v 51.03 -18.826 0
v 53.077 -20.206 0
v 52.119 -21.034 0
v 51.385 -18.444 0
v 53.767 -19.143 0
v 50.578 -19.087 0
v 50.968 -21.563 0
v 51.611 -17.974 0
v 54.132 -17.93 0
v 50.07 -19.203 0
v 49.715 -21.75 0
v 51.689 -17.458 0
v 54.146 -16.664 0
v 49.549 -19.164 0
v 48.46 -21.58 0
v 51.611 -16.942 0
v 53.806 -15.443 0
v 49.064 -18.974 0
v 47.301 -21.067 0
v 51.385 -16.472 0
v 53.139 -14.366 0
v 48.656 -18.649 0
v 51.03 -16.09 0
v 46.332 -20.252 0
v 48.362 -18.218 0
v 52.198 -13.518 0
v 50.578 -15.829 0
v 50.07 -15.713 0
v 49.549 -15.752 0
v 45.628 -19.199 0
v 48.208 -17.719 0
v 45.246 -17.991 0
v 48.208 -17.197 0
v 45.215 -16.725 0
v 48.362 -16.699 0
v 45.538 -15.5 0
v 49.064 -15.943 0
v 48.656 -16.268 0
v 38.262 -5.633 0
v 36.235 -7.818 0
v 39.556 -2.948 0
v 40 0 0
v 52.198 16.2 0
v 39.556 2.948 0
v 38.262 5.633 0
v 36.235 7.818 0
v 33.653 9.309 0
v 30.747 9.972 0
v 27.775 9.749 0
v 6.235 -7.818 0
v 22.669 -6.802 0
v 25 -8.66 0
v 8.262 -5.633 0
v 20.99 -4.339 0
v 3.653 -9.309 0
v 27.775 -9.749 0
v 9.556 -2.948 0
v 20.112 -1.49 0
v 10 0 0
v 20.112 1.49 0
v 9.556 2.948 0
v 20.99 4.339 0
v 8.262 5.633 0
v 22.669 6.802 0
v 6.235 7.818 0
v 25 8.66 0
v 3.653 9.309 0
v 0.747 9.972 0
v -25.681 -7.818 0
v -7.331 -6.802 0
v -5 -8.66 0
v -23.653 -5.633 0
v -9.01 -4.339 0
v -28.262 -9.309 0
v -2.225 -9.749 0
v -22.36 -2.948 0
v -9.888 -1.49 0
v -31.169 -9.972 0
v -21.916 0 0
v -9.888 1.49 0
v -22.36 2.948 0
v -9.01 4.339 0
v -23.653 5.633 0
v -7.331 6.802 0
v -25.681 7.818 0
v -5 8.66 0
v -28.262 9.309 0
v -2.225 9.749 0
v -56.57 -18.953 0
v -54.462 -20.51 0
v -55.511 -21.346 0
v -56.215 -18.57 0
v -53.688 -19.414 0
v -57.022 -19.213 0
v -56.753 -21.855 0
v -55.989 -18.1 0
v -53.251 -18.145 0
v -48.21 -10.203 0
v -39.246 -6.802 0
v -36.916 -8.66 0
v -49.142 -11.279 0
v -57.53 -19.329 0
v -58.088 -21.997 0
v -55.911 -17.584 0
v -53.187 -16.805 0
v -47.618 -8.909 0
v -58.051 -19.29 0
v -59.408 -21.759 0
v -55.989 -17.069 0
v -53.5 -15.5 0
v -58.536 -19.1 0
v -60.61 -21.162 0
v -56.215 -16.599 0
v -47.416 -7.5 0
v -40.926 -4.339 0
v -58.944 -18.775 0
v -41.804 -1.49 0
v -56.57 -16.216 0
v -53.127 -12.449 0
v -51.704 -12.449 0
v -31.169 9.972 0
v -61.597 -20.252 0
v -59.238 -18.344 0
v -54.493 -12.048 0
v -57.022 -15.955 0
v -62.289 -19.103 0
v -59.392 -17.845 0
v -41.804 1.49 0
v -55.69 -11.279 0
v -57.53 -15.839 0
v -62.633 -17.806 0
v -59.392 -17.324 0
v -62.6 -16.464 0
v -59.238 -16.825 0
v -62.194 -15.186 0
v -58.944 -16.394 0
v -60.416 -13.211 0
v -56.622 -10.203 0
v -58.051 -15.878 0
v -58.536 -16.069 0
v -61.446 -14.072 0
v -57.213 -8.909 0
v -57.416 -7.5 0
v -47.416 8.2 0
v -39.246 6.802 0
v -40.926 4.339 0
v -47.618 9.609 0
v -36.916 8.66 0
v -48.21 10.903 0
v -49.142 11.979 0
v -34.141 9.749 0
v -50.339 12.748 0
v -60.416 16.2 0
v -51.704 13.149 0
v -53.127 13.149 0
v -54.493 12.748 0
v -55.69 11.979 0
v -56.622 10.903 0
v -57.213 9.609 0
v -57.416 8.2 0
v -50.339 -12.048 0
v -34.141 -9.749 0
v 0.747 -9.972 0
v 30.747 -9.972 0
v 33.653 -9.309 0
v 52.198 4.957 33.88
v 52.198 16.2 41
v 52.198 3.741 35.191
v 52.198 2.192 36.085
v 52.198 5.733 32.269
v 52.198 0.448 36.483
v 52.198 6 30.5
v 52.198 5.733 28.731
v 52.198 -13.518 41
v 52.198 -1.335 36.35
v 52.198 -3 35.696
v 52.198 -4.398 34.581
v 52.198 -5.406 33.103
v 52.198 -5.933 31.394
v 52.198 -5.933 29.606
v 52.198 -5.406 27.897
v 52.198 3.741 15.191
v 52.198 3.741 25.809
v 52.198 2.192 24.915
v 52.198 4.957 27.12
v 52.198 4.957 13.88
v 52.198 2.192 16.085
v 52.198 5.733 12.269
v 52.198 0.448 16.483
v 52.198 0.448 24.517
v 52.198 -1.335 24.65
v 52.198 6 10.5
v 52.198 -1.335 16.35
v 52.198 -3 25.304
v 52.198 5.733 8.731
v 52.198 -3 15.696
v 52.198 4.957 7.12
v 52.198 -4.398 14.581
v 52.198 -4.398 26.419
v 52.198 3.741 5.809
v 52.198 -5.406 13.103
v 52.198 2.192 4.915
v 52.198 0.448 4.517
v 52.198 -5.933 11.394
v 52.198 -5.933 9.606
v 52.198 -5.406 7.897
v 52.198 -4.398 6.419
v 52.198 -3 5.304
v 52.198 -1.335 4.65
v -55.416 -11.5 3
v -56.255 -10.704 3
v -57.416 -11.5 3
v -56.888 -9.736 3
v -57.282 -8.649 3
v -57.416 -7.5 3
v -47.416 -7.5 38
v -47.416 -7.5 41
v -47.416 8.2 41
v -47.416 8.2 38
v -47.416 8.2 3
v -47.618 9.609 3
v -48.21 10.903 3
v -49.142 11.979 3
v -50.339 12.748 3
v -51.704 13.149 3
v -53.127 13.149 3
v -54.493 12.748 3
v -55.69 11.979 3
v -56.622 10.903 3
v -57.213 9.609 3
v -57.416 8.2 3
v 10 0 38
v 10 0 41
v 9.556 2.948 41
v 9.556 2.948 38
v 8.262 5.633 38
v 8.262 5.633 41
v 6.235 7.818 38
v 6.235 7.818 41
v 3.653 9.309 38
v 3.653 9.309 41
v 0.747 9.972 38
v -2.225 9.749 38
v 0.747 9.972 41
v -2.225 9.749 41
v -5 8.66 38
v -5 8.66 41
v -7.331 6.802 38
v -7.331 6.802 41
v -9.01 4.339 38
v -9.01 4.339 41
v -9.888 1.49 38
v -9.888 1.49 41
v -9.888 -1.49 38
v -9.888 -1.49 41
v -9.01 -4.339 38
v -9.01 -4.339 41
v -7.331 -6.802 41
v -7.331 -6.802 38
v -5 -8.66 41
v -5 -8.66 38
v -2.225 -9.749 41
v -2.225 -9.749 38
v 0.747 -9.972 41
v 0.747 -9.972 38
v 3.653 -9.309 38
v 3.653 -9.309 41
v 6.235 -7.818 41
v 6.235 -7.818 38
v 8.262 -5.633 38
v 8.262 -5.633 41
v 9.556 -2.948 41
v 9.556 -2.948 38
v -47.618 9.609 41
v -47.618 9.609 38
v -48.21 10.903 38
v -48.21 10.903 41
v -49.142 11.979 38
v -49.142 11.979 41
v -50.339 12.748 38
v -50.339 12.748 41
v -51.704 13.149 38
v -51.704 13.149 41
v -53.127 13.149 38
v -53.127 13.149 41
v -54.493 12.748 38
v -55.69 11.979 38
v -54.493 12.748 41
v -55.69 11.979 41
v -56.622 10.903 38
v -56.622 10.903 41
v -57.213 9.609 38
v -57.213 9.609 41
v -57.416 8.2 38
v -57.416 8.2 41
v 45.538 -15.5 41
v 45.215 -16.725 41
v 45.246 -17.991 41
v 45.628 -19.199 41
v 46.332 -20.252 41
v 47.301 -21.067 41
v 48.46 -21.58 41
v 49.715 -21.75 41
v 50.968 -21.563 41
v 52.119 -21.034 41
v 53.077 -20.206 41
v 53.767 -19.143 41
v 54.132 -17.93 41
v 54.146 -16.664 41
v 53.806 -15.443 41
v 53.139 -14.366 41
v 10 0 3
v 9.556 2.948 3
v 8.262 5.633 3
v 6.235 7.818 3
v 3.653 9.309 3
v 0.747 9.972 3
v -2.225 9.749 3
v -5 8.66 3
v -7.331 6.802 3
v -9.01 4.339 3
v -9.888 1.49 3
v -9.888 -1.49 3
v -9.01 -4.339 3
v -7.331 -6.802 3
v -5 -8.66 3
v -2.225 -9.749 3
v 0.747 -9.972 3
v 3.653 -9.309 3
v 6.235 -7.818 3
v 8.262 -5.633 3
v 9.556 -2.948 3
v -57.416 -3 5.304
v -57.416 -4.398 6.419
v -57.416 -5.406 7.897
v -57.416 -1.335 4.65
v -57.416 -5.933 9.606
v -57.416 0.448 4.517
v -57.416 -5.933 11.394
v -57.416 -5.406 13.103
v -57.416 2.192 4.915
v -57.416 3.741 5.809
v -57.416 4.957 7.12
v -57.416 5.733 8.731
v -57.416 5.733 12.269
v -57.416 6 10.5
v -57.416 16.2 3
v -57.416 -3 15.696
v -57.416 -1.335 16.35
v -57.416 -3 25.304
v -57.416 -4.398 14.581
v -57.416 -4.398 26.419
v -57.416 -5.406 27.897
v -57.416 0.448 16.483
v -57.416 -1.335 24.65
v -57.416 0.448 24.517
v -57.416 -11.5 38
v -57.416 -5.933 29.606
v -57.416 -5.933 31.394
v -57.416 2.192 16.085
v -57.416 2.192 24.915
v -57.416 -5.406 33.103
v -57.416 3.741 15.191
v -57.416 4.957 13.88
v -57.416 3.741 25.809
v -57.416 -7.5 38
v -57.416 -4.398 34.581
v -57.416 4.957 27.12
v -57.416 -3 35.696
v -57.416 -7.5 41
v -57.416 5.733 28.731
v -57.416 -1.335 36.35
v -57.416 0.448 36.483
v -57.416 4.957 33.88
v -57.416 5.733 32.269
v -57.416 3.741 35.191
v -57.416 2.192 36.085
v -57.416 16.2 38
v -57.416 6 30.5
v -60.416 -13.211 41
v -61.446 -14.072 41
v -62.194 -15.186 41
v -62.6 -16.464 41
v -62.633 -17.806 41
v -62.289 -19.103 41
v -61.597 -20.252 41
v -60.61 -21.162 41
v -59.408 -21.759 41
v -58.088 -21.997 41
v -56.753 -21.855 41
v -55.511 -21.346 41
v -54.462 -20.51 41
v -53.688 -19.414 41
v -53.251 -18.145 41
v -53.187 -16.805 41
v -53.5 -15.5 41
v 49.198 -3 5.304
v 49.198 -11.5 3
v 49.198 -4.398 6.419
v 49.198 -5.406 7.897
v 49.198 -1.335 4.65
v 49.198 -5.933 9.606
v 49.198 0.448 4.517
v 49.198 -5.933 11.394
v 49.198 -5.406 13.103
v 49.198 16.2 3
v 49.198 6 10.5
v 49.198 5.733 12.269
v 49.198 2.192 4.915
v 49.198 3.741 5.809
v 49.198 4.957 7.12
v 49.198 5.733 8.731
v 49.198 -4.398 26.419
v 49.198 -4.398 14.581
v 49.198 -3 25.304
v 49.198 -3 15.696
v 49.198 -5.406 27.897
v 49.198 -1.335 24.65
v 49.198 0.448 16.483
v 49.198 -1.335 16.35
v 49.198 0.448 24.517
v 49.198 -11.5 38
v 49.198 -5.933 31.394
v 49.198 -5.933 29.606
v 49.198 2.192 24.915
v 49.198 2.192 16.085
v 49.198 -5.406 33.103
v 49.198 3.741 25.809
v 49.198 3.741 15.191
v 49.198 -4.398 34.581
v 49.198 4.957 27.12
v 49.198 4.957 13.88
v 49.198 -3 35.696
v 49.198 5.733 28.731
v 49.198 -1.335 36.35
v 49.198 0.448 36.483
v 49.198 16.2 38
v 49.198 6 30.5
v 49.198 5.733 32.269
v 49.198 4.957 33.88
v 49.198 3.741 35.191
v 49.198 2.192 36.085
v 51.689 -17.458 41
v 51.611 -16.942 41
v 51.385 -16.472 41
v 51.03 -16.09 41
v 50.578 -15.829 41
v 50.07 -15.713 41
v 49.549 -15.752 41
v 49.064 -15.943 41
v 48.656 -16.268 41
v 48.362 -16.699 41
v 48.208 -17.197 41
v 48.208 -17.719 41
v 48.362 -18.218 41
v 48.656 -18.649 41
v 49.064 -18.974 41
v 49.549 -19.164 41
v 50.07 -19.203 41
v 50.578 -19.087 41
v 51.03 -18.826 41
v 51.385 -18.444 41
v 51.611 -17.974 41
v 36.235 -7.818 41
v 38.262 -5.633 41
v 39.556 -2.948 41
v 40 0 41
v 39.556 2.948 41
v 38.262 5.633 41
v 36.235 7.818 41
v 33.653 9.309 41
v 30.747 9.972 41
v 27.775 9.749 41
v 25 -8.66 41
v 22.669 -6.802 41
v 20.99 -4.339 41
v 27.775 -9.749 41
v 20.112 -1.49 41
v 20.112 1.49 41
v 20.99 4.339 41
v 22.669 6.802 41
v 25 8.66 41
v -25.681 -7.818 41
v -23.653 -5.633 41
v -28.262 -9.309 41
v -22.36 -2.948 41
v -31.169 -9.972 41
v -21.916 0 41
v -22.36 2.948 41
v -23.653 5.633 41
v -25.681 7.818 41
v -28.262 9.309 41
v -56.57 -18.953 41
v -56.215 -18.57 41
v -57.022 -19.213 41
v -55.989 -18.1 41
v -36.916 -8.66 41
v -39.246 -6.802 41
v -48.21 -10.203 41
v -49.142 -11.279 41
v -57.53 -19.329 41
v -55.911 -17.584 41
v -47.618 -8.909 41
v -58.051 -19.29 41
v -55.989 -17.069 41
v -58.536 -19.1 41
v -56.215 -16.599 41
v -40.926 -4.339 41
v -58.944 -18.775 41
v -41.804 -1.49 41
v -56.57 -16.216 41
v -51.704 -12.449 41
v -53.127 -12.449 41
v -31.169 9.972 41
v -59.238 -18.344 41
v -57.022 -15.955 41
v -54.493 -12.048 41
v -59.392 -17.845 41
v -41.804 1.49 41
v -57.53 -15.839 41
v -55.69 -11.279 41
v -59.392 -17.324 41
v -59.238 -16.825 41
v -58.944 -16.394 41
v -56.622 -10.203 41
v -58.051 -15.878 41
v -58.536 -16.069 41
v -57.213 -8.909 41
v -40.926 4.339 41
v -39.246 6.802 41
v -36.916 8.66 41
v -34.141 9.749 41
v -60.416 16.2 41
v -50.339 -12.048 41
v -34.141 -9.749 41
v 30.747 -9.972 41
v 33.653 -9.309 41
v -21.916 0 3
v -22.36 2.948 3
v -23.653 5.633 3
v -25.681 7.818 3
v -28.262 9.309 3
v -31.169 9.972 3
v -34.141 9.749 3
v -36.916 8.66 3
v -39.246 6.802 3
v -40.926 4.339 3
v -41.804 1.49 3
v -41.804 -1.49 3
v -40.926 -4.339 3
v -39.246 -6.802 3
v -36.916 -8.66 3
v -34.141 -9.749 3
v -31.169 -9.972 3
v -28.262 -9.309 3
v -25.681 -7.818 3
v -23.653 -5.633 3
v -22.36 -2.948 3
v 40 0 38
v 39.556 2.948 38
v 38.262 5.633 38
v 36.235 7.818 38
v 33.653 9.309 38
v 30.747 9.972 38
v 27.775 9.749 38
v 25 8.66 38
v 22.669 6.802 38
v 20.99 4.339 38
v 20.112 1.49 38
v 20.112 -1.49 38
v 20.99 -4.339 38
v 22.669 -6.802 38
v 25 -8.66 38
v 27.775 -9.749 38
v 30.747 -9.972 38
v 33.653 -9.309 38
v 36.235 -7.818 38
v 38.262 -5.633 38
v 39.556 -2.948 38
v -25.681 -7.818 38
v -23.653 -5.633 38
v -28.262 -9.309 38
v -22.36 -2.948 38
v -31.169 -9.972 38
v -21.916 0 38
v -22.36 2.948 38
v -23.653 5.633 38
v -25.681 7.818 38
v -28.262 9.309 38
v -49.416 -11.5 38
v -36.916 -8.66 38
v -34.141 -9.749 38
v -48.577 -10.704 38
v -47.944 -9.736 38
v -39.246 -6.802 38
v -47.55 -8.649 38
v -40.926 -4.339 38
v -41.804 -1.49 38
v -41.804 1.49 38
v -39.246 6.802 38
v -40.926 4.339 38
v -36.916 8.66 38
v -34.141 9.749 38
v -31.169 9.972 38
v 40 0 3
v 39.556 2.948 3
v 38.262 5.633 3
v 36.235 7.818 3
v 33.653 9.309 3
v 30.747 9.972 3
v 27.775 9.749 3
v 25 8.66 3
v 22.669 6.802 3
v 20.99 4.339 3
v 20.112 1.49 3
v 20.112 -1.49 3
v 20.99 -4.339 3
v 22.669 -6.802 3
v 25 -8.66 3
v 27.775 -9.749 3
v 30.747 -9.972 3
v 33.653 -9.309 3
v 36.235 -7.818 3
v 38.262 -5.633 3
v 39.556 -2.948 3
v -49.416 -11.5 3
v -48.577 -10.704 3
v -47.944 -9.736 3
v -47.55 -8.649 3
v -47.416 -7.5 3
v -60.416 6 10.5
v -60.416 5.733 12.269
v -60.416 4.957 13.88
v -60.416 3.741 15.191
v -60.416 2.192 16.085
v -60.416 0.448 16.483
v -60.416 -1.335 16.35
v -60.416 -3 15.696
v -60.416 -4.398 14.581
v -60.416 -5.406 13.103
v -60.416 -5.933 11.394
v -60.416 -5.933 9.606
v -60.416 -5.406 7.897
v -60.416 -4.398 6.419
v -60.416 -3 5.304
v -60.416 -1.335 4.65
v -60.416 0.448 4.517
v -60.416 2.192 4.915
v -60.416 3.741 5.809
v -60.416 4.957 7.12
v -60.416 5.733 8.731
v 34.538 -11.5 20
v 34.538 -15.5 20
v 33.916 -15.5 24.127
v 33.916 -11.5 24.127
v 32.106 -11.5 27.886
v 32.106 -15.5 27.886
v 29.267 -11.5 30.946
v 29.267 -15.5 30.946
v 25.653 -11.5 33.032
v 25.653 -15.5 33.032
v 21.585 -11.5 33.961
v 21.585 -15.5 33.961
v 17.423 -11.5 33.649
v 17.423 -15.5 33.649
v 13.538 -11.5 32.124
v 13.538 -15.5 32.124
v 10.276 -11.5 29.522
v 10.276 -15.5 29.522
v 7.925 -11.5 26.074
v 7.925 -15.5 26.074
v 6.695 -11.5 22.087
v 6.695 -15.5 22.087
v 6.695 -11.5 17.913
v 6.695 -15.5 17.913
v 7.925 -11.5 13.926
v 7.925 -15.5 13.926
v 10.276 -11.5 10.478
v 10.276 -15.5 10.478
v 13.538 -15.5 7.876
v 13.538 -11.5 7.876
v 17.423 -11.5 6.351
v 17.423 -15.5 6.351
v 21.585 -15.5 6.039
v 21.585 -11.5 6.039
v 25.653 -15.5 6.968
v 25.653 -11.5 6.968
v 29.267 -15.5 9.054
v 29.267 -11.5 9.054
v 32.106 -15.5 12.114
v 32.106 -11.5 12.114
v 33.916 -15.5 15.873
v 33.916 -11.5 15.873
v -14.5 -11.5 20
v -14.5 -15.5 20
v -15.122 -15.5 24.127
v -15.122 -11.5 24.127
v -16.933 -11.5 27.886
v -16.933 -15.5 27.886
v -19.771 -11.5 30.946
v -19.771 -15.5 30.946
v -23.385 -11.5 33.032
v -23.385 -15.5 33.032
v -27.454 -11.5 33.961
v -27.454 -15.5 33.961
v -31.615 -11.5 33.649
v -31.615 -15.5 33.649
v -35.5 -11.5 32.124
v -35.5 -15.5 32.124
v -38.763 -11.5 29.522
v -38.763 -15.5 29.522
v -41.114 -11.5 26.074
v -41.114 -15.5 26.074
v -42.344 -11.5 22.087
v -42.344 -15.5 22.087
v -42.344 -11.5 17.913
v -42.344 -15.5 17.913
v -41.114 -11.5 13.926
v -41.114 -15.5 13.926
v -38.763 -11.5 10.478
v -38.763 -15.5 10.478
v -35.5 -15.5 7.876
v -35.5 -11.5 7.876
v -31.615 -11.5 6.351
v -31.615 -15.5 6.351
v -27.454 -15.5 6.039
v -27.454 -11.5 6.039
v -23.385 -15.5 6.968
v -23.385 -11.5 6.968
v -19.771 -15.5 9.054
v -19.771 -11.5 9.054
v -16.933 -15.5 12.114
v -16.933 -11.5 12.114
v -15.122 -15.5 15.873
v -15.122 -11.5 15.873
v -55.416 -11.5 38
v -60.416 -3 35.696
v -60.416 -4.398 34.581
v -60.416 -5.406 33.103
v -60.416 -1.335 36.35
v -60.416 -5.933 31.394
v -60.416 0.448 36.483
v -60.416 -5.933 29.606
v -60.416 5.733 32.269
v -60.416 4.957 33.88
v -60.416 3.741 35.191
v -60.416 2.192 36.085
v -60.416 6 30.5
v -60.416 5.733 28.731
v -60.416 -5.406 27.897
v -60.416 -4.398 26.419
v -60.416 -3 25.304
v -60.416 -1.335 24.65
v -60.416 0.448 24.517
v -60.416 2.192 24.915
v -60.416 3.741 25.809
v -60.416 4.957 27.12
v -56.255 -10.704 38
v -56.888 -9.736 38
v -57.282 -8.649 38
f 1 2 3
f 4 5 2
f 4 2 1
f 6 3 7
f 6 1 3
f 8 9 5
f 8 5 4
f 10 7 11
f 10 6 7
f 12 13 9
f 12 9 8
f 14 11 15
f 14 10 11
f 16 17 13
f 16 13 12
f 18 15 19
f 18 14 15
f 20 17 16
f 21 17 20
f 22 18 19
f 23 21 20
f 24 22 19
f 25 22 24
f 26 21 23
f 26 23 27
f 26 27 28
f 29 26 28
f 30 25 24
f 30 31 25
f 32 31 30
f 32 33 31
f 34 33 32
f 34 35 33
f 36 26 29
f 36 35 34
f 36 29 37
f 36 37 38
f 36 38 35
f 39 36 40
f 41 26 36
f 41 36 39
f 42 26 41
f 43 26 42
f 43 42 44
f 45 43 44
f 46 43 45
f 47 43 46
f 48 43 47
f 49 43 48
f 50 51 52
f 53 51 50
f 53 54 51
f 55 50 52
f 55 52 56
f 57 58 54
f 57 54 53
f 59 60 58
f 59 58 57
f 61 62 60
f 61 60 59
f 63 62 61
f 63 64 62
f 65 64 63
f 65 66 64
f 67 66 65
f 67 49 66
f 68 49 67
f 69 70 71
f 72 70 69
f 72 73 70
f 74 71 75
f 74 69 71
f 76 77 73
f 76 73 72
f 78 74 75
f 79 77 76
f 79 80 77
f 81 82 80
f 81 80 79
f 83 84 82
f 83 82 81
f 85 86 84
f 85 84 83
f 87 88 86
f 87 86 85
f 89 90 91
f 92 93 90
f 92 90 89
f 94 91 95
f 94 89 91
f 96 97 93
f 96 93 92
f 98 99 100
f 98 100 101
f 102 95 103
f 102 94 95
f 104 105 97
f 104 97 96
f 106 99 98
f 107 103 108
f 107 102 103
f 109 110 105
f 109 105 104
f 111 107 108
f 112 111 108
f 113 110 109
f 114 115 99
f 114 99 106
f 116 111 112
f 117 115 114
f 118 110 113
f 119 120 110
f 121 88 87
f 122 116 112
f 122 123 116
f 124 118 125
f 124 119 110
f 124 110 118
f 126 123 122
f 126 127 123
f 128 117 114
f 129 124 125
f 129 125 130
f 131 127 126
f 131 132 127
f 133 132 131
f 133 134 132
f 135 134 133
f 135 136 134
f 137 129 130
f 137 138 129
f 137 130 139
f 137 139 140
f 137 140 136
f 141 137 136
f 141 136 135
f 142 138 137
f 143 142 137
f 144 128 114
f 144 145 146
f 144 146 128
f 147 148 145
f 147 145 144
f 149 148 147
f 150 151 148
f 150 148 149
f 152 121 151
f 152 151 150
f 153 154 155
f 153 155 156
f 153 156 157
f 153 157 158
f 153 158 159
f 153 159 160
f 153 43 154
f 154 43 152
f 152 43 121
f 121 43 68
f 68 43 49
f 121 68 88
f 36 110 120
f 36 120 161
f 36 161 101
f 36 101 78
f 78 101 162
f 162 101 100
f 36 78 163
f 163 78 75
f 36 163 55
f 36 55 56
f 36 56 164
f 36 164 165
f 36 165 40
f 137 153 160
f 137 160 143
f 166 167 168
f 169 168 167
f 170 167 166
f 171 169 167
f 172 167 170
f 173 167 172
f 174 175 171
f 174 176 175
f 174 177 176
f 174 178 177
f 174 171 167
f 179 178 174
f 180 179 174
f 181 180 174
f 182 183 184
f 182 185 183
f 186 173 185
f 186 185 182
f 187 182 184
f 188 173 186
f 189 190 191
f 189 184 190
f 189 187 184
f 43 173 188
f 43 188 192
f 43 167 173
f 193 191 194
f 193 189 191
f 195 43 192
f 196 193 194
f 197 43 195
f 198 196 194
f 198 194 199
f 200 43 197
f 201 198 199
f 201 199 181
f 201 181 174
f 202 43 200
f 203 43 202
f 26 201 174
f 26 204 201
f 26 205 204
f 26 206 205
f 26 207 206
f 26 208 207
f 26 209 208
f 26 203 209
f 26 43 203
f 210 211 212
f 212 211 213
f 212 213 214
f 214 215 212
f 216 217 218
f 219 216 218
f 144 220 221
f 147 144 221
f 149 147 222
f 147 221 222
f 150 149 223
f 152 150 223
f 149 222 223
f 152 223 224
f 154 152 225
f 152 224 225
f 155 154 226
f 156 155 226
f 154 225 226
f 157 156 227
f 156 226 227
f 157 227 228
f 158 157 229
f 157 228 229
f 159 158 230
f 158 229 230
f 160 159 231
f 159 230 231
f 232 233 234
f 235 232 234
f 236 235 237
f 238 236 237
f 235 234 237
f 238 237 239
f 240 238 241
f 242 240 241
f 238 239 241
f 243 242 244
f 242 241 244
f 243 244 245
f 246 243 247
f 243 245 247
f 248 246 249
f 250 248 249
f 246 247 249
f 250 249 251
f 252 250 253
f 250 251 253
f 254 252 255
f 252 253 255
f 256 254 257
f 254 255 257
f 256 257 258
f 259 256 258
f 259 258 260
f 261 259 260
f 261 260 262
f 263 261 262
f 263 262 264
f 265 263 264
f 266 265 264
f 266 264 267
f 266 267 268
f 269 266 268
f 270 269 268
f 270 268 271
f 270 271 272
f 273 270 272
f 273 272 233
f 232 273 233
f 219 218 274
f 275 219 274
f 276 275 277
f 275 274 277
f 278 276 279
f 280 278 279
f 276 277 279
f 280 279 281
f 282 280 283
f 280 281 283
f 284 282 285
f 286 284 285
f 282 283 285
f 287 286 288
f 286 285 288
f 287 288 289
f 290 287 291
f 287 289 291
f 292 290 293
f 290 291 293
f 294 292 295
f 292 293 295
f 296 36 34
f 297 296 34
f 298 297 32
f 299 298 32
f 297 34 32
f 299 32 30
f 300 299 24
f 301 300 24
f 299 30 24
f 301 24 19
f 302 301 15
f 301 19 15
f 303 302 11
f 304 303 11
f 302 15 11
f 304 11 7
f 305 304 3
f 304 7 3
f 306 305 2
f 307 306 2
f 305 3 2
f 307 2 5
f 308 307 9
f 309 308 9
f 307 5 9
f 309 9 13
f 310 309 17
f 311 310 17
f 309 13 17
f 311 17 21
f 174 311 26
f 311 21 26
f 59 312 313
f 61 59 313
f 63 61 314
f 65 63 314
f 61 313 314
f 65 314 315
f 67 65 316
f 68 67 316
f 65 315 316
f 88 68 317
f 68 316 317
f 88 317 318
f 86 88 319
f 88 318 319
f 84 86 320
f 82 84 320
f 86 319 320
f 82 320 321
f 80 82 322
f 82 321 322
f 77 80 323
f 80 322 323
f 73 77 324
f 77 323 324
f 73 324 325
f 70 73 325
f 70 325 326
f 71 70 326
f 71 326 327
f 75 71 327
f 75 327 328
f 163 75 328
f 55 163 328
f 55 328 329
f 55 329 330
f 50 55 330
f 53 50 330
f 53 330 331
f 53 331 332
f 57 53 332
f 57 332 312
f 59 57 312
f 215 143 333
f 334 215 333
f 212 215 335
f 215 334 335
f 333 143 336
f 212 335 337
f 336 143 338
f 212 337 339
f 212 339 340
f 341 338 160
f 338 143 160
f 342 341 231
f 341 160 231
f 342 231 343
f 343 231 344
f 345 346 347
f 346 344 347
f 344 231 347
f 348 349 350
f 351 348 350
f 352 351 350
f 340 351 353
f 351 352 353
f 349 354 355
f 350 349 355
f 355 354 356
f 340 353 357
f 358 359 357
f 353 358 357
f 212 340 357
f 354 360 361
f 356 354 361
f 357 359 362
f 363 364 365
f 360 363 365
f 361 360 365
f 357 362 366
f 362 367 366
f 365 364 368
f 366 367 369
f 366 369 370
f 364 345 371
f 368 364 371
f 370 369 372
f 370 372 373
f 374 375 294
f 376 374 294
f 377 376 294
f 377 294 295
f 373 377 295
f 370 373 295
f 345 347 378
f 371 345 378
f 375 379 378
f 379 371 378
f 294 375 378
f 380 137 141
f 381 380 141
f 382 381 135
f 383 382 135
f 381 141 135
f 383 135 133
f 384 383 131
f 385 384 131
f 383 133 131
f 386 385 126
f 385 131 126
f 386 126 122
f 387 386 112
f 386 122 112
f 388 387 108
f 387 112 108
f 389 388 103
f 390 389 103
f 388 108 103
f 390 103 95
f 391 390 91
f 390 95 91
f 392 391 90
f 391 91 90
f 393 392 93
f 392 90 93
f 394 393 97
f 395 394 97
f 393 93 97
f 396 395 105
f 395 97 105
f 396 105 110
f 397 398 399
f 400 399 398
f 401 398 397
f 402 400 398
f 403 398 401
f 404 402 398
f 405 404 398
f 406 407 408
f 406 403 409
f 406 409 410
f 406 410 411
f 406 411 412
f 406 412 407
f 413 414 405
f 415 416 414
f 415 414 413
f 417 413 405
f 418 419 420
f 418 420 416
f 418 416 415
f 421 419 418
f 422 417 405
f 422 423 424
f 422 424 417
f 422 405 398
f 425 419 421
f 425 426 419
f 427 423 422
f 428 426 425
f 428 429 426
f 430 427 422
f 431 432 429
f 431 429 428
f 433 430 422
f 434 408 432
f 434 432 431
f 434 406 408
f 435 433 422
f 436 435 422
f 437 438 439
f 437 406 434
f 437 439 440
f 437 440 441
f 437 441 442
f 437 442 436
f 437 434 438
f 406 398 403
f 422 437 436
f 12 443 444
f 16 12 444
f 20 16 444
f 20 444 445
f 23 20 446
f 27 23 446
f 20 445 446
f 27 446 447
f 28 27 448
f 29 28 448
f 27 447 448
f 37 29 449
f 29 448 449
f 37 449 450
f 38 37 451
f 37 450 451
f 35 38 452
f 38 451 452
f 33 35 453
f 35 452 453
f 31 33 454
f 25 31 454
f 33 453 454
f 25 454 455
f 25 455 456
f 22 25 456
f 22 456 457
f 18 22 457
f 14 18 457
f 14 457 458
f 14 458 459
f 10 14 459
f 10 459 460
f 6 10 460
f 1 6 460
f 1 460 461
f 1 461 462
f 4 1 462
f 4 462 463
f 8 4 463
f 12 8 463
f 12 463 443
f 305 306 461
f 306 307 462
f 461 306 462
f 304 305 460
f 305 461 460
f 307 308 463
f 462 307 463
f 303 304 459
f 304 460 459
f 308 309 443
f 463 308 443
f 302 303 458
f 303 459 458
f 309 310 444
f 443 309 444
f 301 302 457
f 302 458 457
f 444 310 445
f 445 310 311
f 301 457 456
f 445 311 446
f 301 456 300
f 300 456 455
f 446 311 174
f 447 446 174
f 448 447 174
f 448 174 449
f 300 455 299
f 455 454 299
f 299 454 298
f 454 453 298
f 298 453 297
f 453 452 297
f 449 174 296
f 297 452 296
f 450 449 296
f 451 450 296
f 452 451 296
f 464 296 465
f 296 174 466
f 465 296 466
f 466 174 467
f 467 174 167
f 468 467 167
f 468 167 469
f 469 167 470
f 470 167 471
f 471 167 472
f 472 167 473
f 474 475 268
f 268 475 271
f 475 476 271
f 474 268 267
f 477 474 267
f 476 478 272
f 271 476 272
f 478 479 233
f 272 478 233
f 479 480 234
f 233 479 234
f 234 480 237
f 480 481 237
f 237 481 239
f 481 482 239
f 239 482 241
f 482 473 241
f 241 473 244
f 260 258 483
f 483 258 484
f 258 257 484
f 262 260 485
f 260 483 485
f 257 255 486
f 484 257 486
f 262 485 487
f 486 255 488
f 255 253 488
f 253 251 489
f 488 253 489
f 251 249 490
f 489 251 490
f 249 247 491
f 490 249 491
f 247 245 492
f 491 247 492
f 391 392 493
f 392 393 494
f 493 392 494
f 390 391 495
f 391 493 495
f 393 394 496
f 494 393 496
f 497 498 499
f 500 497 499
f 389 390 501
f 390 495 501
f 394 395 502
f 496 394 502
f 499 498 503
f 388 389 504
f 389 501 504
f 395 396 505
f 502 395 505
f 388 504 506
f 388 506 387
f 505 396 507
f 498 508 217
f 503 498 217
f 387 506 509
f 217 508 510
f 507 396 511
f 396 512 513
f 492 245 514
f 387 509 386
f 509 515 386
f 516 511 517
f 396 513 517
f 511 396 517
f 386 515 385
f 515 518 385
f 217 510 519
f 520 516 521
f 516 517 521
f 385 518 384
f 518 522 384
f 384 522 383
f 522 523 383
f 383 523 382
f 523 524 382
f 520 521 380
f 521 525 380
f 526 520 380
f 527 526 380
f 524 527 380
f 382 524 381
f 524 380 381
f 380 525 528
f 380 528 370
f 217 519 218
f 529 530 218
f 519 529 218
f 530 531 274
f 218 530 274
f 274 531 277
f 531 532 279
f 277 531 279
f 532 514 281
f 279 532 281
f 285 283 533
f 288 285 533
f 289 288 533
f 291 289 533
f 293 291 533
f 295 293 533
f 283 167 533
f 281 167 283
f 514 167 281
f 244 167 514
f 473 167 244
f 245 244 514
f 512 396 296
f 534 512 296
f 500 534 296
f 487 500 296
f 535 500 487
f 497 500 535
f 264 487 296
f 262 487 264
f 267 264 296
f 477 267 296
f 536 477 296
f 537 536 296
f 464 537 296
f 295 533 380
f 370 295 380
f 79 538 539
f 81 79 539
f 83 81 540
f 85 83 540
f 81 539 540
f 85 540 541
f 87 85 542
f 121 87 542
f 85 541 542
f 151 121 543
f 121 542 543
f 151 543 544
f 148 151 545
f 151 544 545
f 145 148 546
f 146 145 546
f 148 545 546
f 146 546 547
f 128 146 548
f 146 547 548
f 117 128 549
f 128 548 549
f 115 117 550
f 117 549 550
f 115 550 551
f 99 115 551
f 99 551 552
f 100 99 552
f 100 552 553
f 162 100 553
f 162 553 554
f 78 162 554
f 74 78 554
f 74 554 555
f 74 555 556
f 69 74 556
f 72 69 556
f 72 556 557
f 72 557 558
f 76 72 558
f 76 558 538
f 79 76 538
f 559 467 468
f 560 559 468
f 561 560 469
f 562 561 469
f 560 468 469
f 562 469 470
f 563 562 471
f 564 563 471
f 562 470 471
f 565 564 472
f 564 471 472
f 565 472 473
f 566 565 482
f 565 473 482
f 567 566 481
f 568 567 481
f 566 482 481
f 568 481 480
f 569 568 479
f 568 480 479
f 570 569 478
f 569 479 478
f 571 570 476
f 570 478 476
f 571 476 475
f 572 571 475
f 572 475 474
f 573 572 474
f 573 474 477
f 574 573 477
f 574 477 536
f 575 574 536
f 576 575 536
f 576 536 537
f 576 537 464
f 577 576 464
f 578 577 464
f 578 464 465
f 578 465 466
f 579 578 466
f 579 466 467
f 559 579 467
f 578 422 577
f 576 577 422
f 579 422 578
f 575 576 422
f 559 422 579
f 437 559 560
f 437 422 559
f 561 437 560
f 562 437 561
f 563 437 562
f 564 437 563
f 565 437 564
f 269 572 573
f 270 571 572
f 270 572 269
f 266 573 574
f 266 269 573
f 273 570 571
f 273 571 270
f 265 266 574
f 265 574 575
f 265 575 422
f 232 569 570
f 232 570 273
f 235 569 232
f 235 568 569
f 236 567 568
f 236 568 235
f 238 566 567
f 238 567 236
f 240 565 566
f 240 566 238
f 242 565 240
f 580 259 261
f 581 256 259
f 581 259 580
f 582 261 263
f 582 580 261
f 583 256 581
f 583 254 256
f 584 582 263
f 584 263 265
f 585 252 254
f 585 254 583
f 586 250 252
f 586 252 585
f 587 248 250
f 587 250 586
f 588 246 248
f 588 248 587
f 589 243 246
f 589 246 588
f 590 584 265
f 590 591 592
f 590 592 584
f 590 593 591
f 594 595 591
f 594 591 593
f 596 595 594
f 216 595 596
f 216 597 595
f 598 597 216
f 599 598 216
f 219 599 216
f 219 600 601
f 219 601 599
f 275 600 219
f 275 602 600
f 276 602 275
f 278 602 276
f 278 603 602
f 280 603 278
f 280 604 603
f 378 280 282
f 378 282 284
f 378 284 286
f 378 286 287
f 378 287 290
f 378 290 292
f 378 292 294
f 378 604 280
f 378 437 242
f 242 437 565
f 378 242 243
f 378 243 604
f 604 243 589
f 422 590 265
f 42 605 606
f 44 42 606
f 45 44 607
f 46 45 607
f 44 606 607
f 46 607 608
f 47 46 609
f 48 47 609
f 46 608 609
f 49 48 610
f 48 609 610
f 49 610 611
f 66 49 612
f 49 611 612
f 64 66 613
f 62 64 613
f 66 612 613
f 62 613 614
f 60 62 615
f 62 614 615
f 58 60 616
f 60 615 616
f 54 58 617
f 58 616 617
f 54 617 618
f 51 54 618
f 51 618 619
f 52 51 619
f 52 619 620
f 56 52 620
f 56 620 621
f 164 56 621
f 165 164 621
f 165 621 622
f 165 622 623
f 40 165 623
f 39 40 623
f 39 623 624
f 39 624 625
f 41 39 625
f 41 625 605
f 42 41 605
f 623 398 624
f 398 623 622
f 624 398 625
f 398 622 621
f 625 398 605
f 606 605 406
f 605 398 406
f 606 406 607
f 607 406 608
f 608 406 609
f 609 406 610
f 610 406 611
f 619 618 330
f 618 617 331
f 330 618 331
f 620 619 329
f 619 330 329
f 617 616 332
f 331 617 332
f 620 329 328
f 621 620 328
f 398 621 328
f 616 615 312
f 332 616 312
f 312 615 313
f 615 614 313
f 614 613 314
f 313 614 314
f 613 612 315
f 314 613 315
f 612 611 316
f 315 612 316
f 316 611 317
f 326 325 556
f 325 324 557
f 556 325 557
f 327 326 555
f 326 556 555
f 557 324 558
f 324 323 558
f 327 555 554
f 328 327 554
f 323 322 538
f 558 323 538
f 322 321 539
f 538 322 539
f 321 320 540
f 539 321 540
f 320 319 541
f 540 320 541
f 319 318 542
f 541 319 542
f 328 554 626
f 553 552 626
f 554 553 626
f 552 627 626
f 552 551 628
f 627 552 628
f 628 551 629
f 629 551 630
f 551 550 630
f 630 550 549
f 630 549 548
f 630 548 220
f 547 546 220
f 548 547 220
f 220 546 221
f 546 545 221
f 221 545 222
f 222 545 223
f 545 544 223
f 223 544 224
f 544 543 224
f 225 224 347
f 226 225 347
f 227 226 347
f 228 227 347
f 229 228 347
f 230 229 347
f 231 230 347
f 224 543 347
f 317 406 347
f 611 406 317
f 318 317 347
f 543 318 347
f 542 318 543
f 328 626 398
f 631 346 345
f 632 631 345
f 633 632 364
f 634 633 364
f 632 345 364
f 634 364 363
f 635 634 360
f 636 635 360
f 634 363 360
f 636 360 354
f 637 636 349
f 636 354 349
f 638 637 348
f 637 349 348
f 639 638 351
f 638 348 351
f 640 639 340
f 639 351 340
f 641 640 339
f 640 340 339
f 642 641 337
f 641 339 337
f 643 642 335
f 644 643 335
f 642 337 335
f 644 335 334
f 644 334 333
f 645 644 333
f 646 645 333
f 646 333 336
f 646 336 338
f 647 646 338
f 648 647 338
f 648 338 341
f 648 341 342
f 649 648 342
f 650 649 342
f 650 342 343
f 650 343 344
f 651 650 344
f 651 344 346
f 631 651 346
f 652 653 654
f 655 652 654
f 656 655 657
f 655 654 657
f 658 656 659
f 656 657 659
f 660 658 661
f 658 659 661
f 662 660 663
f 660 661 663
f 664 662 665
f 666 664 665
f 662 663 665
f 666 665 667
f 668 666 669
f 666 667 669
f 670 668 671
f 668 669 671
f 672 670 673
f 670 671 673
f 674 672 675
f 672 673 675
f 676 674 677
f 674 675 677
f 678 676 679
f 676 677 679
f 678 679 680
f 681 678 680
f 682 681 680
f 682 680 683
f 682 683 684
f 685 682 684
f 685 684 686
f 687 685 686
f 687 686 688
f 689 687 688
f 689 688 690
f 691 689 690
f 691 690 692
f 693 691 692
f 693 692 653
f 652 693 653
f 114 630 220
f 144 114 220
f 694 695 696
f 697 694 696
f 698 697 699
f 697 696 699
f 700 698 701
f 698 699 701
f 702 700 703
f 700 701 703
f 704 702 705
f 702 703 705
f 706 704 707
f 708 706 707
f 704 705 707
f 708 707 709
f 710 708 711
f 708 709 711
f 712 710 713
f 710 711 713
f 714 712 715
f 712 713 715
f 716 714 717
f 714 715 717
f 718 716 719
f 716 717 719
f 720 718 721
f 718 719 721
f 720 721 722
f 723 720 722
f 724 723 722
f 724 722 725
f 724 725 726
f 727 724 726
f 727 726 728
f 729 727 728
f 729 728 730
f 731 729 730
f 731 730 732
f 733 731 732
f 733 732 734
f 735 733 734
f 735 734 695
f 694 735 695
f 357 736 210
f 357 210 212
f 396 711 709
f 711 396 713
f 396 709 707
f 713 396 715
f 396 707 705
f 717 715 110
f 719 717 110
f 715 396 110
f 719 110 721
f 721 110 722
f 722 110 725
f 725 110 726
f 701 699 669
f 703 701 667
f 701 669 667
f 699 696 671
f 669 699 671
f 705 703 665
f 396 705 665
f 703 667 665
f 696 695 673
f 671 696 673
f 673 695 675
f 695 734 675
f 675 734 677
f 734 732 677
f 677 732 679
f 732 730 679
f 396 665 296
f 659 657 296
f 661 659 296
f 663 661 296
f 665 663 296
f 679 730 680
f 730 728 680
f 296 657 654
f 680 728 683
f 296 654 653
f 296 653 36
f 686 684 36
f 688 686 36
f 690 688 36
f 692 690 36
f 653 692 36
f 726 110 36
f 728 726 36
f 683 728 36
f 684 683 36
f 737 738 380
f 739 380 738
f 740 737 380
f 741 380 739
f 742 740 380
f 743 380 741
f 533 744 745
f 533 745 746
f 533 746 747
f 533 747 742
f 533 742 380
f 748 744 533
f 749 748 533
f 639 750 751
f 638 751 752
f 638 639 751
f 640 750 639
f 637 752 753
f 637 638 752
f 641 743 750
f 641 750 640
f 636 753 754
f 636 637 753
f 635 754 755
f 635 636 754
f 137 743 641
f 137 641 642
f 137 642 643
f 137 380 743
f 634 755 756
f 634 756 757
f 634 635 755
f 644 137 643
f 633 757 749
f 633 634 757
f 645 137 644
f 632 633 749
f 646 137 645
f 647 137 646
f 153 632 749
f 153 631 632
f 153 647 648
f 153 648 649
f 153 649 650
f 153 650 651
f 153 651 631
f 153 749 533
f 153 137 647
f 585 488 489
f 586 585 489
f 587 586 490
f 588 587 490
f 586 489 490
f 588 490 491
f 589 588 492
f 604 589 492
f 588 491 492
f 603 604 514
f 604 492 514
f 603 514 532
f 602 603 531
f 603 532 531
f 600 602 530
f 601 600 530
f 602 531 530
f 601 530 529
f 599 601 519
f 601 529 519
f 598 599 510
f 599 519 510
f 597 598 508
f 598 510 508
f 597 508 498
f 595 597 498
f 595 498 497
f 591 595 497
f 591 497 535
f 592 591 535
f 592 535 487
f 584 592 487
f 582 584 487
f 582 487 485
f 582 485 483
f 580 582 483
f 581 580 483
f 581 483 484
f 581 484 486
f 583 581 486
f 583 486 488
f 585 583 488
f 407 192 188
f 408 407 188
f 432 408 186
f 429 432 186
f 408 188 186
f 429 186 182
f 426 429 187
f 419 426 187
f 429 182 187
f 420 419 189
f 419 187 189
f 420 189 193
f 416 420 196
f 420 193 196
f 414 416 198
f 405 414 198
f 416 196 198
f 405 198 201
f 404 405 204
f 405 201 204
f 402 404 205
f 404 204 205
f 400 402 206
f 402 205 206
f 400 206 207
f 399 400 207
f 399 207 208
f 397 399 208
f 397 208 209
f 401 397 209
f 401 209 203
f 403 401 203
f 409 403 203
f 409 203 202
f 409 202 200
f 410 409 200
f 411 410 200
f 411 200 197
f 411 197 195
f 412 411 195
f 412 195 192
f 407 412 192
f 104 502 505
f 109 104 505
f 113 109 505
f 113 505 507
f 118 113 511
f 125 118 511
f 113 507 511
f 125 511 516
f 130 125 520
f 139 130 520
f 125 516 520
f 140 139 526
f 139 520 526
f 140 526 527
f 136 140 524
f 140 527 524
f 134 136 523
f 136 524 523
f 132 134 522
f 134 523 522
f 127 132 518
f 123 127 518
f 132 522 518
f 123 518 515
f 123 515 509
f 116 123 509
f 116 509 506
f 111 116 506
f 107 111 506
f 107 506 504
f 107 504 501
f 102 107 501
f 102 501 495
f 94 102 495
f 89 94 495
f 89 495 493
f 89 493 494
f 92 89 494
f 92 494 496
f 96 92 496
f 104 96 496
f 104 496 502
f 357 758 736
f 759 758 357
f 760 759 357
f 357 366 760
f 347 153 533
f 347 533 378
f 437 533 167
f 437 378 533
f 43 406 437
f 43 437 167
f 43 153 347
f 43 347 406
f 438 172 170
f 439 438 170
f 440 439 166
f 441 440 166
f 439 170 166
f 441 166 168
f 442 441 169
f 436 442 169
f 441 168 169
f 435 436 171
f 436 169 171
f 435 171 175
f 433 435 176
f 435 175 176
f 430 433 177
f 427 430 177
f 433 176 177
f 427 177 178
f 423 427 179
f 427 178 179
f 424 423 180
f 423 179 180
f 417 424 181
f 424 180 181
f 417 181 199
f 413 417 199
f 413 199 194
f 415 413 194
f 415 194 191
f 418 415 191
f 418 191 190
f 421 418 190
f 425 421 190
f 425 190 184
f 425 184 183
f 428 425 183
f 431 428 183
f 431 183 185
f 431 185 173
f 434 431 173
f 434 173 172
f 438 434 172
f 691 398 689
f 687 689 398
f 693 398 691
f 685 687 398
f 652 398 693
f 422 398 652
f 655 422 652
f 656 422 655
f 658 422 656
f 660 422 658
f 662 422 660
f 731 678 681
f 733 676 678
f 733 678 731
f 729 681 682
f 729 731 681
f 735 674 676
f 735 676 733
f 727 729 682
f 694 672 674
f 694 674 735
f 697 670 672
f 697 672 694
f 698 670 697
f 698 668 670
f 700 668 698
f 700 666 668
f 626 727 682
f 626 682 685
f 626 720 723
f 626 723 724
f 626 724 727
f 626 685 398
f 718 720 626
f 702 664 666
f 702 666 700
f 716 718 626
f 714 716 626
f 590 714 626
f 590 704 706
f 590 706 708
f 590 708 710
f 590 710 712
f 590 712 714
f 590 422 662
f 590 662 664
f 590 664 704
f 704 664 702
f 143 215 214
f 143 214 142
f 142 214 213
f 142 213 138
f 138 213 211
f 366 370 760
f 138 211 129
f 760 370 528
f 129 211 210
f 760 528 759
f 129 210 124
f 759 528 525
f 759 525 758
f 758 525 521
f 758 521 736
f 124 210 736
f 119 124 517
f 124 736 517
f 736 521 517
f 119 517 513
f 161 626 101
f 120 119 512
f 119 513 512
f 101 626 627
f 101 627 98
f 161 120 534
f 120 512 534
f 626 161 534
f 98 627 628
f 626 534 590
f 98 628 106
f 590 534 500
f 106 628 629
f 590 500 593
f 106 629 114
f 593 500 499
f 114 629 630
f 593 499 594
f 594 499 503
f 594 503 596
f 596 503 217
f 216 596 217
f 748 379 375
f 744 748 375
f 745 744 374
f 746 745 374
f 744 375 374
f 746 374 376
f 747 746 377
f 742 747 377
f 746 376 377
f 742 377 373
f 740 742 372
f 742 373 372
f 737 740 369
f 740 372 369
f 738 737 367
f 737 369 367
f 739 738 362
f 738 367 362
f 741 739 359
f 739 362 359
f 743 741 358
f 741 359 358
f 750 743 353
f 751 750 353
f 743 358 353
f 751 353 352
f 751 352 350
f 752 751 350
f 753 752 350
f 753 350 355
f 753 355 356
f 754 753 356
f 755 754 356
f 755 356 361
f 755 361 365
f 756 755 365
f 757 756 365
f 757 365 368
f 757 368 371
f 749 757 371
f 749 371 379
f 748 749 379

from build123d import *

# Parameters (mm, degrees)
PAD_DEPTH       = 41
SKETCH001_W     = 106.614
SKETCH001_H     = 35
POCKET_DEPTH    = 27.7
SKETCH002_R     = 10
SKETCH002_R_2   = 1.75
POCKET001_DEPTH = 41.001
SKETCH003_R     = 14
POCKET002_DEPTH = 31.701
SKETCH004_R     = 6
POCKET003_DEPTH = 114.865


with BuildPart() as part:
    # Sketch → Pad (new body)
    with BuildSketch(Plane.XY):
        with BuildLine():
            Line((-60.41588, 16.2), (52.19812, 16.2))
            Line((52.19812, 16.2), (52.19812, -13.517735))
            ThreePointArc((45.538339, -15.5), (50.967872, -21.563001), (52.19812, -13.517735))
            Line((-53.5, -15.5), (45.538339, -15.5))
            ThreePointArc((-60.41588, -13.211126), (-59.408323, -21.759447), (-53.5, -15.5))
            Line((-60.41588, -13.211126), (-60.41588, 16.2))
        make_face()
    extrude(amount=PAD_DEPTH)

    # Sketch001 → Pocket (cut)
    with BuildSketch(Plane(origin=(0, 16.2, 0), x_dir=(-1, 0, 0), z_dir=(0, 1, 0))):
        with Locations((4.10888, 20.5)):
            Rectangle(SKETCH001_W, SKETCH001_H)
    extrude(amount=-POCKET_DEPTH, mode=Mode.SUBTRACT)

    # Sketch002 → Pocket001 (cut, through all)
    with BuildSketch(Plane.XY.offset(41)):
        with Locations((-31.91588, 0)):
            Circle(SKETCH002_R)
        Circle(SKETCH002_R)
        with Locations((30, 0)):
            Circle(SKETCH002_R)
        with Locations((49.938726, -17.458258)):
            Circle(SKETCH002_R_2)
        with Locations((-57.661274, -17.584375)):
            Circle(SKETCH002_R_2)
        with BuildLine():
            ThreePointArc((-57.41588, -7.499976), (-52.415893, -12.499999), (-47.41588, -7.5))
            Line((-47.41588, -7.5), (-47.41588, 8.2))
            ThreePointArc((-47.41588, 8.2), (-52.41587, 13.2), (-57.41588, 8.200022))
            Line((-57.41588, -7.499976), (-57.41588, 8.200022))
        make_face()
    extrude(amount=-POCKET001_DEPTH, mode=Mode.SUBTRACT)

    # Sketch003 → Pocket002 (cut, through all)
    with BuildSketch(Plane.XZ.offset(15.5)):
        with Locations((-28.5, 20)):
            Circle(SKETCH003_R)
        with Locations((20.538339, 20)):
            Circle(SKETCH003_R)
    extrude(amount=-POCKET002_DEPTH, mode=Mode.SUBTRACT)

    # Sketch004 → Pocket003 (cut, through all)
    with BuildSketch(Plane.YZ.offset(52.19812)):
        with Locations((0, 30.5)):
            Circle(SKETCH004_R)
        with Locations((0, 10.5)):
            Circle(SKETCH004_R)
    extrude(amount=-POCKET003_DEPTH, mode=Mode.SUBTRACT)


solid = part.part
